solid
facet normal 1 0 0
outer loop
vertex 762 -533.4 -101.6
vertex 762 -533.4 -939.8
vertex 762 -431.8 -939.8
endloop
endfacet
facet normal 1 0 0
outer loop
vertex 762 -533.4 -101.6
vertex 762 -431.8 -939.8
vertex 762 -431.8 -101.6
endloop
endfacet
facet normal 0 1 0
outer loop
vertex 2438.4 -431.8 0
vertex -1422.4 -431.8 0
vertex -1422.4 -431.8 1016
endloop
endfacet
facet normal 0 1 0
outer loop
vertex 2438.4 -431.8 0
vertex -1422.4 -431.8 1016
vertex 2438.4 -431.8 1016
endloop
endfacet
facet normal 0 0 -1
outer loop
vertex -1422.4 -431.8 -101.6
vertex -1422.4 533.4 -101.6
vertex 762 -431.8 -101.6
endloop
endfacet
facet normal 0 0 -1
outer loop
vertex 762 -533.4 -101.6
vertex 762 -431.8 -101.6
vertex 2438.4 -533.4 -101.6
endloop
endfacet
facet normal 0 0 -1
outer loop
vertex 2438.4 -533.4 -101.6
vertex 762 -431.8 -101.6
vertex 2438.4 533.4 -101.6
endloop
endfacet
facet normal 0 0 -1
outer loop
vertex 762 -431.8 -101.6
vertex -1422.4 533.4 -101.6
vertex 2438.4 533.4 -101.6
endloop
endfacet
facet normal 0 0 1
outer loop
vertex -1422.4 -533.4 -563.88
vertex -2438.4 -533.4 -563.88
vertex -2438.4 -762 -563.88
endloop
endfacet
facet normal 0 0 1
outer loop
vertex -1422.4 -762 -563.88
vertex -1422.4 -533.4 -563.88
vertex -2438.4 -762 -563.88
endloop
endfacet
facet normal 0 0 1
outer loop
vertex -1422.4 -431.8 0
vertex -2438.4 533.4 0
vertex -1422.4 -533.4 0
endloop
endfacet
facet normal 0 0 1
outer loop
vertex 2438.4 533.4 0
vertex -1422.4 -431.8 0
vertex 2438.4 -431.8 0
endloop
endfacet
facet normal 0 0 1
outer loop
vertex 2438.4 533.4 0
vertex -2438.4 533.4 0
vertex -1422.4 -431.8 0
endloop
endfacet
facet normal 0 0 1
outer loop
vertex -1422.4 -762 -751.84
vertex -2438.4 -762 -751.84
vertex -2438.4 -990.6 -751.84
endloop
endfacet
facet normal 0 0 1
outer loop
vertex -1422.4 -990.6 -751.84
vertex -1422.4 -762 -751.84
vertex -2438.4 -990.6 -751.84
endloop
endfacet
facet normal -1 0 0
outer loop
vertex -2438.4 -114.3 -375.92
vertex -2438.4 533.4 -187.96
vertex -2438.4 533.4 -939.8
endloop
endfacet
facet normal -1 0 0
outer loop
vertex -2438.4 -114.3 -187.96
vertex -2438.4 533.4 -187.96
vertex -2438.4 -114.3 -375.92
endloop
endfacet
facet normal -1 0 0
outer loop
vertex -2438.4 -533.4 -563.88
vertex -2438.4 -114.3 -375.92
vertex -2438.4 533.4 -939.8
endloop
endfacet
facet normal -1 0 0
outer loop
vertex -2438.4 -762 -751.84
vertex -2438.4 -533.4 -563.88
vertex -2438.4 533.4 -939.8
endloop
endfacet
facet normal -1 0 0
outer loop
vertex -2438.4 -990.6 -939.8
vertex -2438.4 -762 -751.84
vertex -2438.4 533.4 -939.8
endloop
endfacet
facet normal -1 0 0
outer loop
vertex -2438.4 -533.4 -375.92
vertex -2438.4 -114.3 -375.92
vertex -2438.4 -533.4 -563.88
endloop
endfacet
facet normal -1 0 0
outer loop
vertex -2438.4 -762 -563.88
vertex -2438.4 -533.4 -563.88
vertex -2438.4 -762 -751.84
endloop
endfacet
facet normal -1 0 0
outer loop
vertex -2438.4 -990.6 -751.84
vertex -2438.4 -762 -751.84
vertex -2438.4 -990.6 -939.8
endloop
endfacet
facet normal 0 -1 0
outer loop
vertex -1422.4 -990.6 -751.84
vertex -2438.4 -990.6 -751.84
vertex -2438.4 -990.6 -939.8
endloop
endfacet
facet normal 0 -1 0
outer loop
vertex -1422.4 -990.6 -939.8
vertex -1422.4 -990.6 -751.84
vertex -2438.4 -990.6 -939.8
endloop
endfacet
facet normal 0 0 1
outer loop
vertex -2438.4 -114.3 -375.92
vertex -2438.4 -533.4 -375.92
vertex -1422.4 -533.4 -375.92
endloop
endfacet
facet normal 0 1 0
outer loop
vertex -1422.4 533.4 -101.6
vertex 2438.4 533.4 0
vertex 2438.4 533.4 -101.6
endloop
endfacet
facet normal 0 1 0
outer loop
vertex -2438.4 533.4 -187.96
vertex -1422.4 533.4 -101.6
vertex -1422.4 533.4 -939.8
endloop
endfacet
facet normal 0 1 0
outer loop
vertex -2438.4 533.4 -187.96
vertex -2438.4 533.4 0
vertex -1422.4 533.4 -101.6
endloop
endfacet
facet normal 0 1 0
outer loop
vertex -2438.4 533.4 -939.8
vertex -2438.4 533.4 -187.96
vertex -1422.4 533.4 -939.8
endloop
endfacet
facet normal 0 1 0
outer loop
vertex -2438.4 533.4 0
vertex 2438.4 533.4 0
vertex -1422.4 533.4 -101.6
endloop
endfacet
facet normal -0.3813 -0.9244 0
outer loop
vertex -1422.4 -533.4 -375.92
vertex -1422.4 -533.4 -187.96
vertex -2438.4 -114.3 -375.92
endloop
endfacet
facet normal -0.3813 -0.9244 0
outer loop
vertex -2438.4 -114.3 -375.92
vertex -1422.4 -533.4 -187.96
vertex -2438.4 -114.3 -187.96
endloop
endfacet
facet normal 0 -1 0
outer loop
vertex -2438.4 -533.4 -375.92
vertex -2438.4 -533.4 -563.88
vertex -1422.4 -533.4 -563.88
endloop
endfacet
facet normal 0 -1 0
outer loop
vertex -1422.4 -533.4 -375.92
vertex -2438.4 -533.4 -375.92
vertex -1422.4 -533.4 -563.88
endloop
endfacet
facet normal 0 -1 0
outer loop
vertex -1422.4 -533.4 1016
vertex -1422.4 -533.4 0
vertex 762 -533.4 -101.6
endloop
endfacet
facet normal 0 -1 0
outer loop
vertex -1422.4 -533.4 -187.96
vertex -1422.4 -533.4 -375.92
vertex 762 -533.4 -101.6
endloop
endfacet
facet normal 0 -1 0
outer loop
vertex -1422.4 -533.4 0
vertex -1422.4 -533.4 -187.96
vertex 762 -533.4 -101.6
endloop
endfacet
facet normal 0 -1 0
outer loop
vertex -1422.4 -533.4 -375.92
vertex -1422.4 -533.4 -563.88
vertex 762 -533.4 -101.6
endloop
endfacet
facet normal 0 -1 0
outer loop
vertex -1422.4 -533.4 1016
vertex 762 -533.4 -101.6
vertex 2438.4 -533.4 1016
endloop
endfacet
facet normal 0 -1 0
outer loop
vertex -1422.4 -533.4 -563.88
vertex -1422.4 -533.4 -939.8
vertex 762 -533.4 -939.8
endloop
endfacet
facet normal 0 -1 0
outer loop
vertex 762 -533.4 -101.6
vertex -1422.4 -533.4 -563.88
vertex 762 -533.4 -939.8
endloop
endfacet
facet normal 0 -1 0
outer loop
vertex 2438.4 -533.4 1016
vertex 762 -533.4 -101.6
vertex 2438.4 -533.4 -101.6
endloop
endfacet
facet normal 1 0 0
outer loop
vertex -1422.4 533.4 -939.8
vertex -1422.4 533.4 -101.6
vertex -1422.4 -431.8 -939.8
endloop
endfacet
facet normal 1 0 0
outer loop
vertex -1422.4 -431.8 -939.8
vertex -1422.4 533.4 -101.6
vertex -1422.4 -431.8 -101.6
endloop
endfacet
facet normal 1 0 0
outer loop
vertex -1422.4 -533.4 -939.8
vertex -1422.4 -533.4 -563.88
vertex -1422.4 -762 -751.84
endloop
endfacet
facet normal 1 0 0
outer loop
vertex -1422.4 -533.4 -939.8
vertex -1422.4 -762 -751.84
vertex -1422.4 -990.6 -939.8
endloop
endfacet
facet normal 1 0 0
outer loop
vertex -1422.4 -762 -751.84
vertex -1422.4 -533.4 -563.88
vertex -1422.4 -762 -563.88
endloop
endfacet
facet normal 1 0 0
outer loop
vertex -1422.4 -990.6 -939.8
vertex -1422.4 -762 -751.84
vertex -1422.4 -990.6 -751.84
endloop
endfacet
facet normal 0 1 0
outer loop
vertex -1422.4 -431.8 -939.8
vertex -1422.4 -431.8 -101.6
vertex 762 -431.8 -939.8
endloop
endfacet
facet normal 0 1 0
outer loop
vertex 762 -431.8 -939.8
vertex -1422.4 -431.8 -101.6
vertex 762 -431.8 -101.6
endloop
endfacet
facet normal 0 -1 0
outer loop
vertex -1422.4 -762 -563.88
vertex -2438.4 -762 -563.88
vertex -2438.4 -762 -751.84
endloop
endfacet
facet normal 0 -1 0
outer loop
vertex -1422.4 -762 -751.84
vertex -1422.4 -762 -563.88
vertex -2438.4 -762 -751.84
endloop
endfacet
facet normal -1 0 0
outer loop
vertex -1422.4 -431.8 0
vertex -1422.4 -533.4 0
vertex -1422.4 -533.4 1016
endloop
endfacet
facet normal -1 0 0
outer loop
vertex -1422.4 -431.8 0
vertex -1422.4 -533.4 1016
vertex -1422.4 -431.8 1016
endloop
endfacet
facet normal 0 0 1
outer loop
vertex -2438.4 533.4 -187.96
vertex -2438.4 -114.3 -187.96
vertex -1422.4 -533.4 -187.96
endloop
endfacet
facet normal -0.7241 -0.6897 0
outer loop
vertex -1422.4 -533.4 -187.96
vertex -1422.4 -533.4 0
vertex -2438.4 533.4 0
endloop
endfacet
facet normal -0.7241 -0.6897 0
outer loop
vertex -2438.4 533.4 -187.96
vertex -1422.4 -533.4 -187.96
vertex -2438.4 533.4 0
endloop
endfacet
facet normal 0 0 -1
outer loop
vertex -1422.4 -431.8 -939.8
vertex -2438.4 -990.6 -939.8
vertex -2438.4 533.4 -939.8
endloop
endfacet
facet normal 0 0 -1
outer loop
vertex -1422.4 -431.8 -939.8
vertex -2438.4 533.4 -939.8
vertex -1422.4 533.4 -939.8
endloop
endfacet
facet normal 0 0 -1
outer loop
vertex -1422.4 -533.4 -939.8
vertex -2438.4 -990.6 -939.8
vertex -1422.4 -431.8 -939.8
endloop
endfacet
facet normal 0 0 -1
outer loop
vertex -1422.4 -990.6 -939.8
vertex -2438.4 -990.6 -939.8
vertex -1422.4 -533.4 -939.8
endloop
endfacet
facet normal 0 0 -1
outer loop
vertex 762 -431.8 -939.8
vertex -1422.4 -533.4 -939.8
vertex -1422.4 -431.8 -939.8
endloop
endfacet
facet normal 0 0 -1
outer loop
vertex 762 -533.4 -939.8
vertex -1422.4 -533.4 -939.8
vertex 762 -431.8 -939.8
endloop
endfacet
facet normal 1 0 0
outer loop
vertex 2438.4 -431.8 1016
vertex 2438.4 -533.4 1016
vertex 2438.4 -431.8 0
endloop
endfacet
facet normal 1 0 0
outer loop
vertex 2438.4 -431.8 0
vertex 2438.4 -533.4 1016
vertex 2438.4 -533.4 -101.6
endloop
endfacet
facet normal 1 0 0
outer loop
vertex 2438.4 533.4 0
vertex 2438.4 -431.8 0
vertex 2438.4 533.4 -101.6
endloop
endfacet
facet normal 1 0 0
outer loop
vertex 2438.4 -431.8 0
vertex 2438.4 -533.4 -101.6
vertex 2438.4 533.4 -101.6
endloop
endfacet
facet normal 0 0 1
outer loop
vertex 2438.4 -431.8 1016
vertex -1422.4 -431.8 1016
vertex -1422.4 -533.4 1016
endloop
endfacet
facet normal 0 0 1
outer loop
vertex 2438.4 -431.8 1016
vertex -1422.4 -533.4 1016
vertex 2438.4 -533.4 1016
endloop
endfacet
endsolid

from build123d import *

# Parameters (mm, degrees)
F0_W      = 4876.8
F0_H      = 1066.8
F1_DEPTH  = 101.6
F3_DEPTH  = 1016
F5_DEPTH  = 101.6
F7_DEPTH  = 187.96
F9_DEPTH  = 187.96
F11_DEPTH = 1300.3193
F12_W     = 2184.4
F12_H     = 838.2
F13_DEPTH = 101.6
F14_W     = 3860.8
F14_H     = 101.6
F15_DEPTH = 1016


with BuildPart() as f1:
    # F0 (on Top) → F1 (new body)
    with BuildSketch(Plane.XY):
        Rectangle(F0_W, F0_H)
    extrude(amount=-F1_DEPTH)

    # F2 (on face) → F3 (join)
    with BuildSketch(Plane(origin=(-2438.4, 0, 0), x_dir=(0, -1, 0), z_dir=(-1, 0, 0))):
        Polygon((533.4, -187.96), (533.4, 0), (304.8, 0), (-533.4, 0), (-533.4, -939.8), (304.8, -939.8), (1447.8, -939.8), (1447.8, -751.84), (1219.2, -751.84), (1219.2, -563.88), (990.6, -563.88), (990.6, -375.92), (762, -375.92), (762, -187.96), align=None)
    extrude(amount=-F3_DEPTH)

    # F4 (on face) → F5 (join)
    with BuildSketch(Plane.XZ.offset(533.4)):
        Polygon((762, -101.6), (-1422.4, -101.6), (-1422.4, -187.96), (-1422.4, -939.8), (-812.8, -939.8), (-812.8, -228.6), (-355.6, -228.6), (-355.6, -939.8), (-304.8, -939.8), (-304.8, -228.6), (152.4, -228.6), (152.4, -939.8), (762, -939.8), align=None)
    extrude(amount=-F5_DEPTH)

    # F6 (on face) → F7 (cut)
    with BuildSketch(Plane.XY):
        Polygon((-2438.4, -533.4), (-1422.4, -533.4), (-2438.4, 533.4), align=None)
    extrude(amount=-F7_DEPTH, mode=Mode.SUBTRACT)

    # F8 (on face) → F9 (cut)
    with BuildSketch(Plane.XY.offset(-187.96)):
        Polygon((-1422.4, -762), (-1422.4, -533.4), (-2438.4, -114.3), (-2438.4, -533.4), (-2438.4, -762), align=None)
    extrude(amount=-F9_DEPTH, mode=Mode.SUBTRACT)

    # F10 (on face) → F11 (cut)
    with BuildSketch(Plane(origin=(-2438.4, 0, 0), x_dir=(0, -1, 0), z_dir=(-1, 0, 0))):
        Polygon((1447.8, -375.92), (533.4, -375.92), (533.4, -563.88), (762, -563.88), (762, -751.84), (990.6, -751.84), (990.6, -939.8), (1447.8, -939.8), align=None)
    extrude(amount=-F11_DEPTH, mode=Mode.SUBTRACT)

    # F12 (on face) → F13 (join)
    with BuildSketch(Plane.XZ.offset(533.4)):
        with Locations((-330.2, -520.7)):
            Rectangle(F12_W, F12_H)
    extrude(amount=-F13_DEPTH)

    # F14 (on face) → F15 (join)
    with BuildSketch(Plane.XY):
        with Locations((508, -482.6)):
            Rectangle(F14_W, F14_H)
    extrude(amount=F15_DEPTH)


solid = f1.part
